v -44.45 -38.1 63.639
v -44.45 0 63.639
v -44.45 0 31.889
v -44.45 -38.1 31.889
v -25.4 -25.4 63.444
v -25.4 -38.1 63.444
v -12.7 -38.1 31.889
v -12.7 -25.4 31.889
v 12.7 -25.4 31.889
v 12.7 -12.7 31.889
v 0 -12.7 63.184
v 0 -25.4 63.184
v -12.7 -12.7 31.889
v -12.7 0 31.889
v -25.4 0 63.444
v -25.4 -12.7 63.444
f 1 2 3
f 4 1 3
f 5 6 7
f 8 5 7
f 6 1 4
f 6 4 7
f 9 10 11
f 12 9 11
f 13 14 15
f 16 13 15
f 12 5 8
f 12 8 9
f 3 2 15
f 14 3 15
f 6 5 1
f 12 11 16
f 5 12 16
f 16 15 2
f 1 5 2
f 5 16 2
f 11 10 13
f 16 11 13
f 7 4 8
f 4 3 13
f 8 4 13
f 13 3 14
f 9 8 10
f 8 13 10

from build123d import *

# Parameters (mm, degrees)
F1_DEPTH = 38.1
F3_DEPTH = 12.7
F5_DEPTH = 12.7


with BuildPart() as f1:
    # F0 (on Front) → F1 (new body)
    with BuildSketch(Plane.XZ):
        Polygon((0, 63.183765), (-44.45, 63.639142), (-44.45, 31.889142), (12.7, 31.889142), align=None)
    extrude(amount=F1_DEPTH)

    # F2 (on face) → F3 (cut)
    with BuildSketch(Plane.XZ.offset(38.1)):
        Polygon((0, 63.183765), (-25.4, 63.443981), (-12.7, 31.889142), (12.7, 31.889142), align=None)
    extrude(amount=-F3_DEPTH, mode=Mode.SUBTRACT)

    # F4 (on face) → F5 (cut)
    with BuildSketch(Plane(origin=(0, 0, 0), x_dir=(-1, 0, 0), z_dir=(0, 1, 0))):
        Polygon((12.7, 31.889142), (25.4, 63.443981), (0, 63.183765), (-12.7, 31.889142), align=None)
    extrude(amount=-F5_DEPTH, mode=Mode.SUBTRACT)


solid = f1.part
